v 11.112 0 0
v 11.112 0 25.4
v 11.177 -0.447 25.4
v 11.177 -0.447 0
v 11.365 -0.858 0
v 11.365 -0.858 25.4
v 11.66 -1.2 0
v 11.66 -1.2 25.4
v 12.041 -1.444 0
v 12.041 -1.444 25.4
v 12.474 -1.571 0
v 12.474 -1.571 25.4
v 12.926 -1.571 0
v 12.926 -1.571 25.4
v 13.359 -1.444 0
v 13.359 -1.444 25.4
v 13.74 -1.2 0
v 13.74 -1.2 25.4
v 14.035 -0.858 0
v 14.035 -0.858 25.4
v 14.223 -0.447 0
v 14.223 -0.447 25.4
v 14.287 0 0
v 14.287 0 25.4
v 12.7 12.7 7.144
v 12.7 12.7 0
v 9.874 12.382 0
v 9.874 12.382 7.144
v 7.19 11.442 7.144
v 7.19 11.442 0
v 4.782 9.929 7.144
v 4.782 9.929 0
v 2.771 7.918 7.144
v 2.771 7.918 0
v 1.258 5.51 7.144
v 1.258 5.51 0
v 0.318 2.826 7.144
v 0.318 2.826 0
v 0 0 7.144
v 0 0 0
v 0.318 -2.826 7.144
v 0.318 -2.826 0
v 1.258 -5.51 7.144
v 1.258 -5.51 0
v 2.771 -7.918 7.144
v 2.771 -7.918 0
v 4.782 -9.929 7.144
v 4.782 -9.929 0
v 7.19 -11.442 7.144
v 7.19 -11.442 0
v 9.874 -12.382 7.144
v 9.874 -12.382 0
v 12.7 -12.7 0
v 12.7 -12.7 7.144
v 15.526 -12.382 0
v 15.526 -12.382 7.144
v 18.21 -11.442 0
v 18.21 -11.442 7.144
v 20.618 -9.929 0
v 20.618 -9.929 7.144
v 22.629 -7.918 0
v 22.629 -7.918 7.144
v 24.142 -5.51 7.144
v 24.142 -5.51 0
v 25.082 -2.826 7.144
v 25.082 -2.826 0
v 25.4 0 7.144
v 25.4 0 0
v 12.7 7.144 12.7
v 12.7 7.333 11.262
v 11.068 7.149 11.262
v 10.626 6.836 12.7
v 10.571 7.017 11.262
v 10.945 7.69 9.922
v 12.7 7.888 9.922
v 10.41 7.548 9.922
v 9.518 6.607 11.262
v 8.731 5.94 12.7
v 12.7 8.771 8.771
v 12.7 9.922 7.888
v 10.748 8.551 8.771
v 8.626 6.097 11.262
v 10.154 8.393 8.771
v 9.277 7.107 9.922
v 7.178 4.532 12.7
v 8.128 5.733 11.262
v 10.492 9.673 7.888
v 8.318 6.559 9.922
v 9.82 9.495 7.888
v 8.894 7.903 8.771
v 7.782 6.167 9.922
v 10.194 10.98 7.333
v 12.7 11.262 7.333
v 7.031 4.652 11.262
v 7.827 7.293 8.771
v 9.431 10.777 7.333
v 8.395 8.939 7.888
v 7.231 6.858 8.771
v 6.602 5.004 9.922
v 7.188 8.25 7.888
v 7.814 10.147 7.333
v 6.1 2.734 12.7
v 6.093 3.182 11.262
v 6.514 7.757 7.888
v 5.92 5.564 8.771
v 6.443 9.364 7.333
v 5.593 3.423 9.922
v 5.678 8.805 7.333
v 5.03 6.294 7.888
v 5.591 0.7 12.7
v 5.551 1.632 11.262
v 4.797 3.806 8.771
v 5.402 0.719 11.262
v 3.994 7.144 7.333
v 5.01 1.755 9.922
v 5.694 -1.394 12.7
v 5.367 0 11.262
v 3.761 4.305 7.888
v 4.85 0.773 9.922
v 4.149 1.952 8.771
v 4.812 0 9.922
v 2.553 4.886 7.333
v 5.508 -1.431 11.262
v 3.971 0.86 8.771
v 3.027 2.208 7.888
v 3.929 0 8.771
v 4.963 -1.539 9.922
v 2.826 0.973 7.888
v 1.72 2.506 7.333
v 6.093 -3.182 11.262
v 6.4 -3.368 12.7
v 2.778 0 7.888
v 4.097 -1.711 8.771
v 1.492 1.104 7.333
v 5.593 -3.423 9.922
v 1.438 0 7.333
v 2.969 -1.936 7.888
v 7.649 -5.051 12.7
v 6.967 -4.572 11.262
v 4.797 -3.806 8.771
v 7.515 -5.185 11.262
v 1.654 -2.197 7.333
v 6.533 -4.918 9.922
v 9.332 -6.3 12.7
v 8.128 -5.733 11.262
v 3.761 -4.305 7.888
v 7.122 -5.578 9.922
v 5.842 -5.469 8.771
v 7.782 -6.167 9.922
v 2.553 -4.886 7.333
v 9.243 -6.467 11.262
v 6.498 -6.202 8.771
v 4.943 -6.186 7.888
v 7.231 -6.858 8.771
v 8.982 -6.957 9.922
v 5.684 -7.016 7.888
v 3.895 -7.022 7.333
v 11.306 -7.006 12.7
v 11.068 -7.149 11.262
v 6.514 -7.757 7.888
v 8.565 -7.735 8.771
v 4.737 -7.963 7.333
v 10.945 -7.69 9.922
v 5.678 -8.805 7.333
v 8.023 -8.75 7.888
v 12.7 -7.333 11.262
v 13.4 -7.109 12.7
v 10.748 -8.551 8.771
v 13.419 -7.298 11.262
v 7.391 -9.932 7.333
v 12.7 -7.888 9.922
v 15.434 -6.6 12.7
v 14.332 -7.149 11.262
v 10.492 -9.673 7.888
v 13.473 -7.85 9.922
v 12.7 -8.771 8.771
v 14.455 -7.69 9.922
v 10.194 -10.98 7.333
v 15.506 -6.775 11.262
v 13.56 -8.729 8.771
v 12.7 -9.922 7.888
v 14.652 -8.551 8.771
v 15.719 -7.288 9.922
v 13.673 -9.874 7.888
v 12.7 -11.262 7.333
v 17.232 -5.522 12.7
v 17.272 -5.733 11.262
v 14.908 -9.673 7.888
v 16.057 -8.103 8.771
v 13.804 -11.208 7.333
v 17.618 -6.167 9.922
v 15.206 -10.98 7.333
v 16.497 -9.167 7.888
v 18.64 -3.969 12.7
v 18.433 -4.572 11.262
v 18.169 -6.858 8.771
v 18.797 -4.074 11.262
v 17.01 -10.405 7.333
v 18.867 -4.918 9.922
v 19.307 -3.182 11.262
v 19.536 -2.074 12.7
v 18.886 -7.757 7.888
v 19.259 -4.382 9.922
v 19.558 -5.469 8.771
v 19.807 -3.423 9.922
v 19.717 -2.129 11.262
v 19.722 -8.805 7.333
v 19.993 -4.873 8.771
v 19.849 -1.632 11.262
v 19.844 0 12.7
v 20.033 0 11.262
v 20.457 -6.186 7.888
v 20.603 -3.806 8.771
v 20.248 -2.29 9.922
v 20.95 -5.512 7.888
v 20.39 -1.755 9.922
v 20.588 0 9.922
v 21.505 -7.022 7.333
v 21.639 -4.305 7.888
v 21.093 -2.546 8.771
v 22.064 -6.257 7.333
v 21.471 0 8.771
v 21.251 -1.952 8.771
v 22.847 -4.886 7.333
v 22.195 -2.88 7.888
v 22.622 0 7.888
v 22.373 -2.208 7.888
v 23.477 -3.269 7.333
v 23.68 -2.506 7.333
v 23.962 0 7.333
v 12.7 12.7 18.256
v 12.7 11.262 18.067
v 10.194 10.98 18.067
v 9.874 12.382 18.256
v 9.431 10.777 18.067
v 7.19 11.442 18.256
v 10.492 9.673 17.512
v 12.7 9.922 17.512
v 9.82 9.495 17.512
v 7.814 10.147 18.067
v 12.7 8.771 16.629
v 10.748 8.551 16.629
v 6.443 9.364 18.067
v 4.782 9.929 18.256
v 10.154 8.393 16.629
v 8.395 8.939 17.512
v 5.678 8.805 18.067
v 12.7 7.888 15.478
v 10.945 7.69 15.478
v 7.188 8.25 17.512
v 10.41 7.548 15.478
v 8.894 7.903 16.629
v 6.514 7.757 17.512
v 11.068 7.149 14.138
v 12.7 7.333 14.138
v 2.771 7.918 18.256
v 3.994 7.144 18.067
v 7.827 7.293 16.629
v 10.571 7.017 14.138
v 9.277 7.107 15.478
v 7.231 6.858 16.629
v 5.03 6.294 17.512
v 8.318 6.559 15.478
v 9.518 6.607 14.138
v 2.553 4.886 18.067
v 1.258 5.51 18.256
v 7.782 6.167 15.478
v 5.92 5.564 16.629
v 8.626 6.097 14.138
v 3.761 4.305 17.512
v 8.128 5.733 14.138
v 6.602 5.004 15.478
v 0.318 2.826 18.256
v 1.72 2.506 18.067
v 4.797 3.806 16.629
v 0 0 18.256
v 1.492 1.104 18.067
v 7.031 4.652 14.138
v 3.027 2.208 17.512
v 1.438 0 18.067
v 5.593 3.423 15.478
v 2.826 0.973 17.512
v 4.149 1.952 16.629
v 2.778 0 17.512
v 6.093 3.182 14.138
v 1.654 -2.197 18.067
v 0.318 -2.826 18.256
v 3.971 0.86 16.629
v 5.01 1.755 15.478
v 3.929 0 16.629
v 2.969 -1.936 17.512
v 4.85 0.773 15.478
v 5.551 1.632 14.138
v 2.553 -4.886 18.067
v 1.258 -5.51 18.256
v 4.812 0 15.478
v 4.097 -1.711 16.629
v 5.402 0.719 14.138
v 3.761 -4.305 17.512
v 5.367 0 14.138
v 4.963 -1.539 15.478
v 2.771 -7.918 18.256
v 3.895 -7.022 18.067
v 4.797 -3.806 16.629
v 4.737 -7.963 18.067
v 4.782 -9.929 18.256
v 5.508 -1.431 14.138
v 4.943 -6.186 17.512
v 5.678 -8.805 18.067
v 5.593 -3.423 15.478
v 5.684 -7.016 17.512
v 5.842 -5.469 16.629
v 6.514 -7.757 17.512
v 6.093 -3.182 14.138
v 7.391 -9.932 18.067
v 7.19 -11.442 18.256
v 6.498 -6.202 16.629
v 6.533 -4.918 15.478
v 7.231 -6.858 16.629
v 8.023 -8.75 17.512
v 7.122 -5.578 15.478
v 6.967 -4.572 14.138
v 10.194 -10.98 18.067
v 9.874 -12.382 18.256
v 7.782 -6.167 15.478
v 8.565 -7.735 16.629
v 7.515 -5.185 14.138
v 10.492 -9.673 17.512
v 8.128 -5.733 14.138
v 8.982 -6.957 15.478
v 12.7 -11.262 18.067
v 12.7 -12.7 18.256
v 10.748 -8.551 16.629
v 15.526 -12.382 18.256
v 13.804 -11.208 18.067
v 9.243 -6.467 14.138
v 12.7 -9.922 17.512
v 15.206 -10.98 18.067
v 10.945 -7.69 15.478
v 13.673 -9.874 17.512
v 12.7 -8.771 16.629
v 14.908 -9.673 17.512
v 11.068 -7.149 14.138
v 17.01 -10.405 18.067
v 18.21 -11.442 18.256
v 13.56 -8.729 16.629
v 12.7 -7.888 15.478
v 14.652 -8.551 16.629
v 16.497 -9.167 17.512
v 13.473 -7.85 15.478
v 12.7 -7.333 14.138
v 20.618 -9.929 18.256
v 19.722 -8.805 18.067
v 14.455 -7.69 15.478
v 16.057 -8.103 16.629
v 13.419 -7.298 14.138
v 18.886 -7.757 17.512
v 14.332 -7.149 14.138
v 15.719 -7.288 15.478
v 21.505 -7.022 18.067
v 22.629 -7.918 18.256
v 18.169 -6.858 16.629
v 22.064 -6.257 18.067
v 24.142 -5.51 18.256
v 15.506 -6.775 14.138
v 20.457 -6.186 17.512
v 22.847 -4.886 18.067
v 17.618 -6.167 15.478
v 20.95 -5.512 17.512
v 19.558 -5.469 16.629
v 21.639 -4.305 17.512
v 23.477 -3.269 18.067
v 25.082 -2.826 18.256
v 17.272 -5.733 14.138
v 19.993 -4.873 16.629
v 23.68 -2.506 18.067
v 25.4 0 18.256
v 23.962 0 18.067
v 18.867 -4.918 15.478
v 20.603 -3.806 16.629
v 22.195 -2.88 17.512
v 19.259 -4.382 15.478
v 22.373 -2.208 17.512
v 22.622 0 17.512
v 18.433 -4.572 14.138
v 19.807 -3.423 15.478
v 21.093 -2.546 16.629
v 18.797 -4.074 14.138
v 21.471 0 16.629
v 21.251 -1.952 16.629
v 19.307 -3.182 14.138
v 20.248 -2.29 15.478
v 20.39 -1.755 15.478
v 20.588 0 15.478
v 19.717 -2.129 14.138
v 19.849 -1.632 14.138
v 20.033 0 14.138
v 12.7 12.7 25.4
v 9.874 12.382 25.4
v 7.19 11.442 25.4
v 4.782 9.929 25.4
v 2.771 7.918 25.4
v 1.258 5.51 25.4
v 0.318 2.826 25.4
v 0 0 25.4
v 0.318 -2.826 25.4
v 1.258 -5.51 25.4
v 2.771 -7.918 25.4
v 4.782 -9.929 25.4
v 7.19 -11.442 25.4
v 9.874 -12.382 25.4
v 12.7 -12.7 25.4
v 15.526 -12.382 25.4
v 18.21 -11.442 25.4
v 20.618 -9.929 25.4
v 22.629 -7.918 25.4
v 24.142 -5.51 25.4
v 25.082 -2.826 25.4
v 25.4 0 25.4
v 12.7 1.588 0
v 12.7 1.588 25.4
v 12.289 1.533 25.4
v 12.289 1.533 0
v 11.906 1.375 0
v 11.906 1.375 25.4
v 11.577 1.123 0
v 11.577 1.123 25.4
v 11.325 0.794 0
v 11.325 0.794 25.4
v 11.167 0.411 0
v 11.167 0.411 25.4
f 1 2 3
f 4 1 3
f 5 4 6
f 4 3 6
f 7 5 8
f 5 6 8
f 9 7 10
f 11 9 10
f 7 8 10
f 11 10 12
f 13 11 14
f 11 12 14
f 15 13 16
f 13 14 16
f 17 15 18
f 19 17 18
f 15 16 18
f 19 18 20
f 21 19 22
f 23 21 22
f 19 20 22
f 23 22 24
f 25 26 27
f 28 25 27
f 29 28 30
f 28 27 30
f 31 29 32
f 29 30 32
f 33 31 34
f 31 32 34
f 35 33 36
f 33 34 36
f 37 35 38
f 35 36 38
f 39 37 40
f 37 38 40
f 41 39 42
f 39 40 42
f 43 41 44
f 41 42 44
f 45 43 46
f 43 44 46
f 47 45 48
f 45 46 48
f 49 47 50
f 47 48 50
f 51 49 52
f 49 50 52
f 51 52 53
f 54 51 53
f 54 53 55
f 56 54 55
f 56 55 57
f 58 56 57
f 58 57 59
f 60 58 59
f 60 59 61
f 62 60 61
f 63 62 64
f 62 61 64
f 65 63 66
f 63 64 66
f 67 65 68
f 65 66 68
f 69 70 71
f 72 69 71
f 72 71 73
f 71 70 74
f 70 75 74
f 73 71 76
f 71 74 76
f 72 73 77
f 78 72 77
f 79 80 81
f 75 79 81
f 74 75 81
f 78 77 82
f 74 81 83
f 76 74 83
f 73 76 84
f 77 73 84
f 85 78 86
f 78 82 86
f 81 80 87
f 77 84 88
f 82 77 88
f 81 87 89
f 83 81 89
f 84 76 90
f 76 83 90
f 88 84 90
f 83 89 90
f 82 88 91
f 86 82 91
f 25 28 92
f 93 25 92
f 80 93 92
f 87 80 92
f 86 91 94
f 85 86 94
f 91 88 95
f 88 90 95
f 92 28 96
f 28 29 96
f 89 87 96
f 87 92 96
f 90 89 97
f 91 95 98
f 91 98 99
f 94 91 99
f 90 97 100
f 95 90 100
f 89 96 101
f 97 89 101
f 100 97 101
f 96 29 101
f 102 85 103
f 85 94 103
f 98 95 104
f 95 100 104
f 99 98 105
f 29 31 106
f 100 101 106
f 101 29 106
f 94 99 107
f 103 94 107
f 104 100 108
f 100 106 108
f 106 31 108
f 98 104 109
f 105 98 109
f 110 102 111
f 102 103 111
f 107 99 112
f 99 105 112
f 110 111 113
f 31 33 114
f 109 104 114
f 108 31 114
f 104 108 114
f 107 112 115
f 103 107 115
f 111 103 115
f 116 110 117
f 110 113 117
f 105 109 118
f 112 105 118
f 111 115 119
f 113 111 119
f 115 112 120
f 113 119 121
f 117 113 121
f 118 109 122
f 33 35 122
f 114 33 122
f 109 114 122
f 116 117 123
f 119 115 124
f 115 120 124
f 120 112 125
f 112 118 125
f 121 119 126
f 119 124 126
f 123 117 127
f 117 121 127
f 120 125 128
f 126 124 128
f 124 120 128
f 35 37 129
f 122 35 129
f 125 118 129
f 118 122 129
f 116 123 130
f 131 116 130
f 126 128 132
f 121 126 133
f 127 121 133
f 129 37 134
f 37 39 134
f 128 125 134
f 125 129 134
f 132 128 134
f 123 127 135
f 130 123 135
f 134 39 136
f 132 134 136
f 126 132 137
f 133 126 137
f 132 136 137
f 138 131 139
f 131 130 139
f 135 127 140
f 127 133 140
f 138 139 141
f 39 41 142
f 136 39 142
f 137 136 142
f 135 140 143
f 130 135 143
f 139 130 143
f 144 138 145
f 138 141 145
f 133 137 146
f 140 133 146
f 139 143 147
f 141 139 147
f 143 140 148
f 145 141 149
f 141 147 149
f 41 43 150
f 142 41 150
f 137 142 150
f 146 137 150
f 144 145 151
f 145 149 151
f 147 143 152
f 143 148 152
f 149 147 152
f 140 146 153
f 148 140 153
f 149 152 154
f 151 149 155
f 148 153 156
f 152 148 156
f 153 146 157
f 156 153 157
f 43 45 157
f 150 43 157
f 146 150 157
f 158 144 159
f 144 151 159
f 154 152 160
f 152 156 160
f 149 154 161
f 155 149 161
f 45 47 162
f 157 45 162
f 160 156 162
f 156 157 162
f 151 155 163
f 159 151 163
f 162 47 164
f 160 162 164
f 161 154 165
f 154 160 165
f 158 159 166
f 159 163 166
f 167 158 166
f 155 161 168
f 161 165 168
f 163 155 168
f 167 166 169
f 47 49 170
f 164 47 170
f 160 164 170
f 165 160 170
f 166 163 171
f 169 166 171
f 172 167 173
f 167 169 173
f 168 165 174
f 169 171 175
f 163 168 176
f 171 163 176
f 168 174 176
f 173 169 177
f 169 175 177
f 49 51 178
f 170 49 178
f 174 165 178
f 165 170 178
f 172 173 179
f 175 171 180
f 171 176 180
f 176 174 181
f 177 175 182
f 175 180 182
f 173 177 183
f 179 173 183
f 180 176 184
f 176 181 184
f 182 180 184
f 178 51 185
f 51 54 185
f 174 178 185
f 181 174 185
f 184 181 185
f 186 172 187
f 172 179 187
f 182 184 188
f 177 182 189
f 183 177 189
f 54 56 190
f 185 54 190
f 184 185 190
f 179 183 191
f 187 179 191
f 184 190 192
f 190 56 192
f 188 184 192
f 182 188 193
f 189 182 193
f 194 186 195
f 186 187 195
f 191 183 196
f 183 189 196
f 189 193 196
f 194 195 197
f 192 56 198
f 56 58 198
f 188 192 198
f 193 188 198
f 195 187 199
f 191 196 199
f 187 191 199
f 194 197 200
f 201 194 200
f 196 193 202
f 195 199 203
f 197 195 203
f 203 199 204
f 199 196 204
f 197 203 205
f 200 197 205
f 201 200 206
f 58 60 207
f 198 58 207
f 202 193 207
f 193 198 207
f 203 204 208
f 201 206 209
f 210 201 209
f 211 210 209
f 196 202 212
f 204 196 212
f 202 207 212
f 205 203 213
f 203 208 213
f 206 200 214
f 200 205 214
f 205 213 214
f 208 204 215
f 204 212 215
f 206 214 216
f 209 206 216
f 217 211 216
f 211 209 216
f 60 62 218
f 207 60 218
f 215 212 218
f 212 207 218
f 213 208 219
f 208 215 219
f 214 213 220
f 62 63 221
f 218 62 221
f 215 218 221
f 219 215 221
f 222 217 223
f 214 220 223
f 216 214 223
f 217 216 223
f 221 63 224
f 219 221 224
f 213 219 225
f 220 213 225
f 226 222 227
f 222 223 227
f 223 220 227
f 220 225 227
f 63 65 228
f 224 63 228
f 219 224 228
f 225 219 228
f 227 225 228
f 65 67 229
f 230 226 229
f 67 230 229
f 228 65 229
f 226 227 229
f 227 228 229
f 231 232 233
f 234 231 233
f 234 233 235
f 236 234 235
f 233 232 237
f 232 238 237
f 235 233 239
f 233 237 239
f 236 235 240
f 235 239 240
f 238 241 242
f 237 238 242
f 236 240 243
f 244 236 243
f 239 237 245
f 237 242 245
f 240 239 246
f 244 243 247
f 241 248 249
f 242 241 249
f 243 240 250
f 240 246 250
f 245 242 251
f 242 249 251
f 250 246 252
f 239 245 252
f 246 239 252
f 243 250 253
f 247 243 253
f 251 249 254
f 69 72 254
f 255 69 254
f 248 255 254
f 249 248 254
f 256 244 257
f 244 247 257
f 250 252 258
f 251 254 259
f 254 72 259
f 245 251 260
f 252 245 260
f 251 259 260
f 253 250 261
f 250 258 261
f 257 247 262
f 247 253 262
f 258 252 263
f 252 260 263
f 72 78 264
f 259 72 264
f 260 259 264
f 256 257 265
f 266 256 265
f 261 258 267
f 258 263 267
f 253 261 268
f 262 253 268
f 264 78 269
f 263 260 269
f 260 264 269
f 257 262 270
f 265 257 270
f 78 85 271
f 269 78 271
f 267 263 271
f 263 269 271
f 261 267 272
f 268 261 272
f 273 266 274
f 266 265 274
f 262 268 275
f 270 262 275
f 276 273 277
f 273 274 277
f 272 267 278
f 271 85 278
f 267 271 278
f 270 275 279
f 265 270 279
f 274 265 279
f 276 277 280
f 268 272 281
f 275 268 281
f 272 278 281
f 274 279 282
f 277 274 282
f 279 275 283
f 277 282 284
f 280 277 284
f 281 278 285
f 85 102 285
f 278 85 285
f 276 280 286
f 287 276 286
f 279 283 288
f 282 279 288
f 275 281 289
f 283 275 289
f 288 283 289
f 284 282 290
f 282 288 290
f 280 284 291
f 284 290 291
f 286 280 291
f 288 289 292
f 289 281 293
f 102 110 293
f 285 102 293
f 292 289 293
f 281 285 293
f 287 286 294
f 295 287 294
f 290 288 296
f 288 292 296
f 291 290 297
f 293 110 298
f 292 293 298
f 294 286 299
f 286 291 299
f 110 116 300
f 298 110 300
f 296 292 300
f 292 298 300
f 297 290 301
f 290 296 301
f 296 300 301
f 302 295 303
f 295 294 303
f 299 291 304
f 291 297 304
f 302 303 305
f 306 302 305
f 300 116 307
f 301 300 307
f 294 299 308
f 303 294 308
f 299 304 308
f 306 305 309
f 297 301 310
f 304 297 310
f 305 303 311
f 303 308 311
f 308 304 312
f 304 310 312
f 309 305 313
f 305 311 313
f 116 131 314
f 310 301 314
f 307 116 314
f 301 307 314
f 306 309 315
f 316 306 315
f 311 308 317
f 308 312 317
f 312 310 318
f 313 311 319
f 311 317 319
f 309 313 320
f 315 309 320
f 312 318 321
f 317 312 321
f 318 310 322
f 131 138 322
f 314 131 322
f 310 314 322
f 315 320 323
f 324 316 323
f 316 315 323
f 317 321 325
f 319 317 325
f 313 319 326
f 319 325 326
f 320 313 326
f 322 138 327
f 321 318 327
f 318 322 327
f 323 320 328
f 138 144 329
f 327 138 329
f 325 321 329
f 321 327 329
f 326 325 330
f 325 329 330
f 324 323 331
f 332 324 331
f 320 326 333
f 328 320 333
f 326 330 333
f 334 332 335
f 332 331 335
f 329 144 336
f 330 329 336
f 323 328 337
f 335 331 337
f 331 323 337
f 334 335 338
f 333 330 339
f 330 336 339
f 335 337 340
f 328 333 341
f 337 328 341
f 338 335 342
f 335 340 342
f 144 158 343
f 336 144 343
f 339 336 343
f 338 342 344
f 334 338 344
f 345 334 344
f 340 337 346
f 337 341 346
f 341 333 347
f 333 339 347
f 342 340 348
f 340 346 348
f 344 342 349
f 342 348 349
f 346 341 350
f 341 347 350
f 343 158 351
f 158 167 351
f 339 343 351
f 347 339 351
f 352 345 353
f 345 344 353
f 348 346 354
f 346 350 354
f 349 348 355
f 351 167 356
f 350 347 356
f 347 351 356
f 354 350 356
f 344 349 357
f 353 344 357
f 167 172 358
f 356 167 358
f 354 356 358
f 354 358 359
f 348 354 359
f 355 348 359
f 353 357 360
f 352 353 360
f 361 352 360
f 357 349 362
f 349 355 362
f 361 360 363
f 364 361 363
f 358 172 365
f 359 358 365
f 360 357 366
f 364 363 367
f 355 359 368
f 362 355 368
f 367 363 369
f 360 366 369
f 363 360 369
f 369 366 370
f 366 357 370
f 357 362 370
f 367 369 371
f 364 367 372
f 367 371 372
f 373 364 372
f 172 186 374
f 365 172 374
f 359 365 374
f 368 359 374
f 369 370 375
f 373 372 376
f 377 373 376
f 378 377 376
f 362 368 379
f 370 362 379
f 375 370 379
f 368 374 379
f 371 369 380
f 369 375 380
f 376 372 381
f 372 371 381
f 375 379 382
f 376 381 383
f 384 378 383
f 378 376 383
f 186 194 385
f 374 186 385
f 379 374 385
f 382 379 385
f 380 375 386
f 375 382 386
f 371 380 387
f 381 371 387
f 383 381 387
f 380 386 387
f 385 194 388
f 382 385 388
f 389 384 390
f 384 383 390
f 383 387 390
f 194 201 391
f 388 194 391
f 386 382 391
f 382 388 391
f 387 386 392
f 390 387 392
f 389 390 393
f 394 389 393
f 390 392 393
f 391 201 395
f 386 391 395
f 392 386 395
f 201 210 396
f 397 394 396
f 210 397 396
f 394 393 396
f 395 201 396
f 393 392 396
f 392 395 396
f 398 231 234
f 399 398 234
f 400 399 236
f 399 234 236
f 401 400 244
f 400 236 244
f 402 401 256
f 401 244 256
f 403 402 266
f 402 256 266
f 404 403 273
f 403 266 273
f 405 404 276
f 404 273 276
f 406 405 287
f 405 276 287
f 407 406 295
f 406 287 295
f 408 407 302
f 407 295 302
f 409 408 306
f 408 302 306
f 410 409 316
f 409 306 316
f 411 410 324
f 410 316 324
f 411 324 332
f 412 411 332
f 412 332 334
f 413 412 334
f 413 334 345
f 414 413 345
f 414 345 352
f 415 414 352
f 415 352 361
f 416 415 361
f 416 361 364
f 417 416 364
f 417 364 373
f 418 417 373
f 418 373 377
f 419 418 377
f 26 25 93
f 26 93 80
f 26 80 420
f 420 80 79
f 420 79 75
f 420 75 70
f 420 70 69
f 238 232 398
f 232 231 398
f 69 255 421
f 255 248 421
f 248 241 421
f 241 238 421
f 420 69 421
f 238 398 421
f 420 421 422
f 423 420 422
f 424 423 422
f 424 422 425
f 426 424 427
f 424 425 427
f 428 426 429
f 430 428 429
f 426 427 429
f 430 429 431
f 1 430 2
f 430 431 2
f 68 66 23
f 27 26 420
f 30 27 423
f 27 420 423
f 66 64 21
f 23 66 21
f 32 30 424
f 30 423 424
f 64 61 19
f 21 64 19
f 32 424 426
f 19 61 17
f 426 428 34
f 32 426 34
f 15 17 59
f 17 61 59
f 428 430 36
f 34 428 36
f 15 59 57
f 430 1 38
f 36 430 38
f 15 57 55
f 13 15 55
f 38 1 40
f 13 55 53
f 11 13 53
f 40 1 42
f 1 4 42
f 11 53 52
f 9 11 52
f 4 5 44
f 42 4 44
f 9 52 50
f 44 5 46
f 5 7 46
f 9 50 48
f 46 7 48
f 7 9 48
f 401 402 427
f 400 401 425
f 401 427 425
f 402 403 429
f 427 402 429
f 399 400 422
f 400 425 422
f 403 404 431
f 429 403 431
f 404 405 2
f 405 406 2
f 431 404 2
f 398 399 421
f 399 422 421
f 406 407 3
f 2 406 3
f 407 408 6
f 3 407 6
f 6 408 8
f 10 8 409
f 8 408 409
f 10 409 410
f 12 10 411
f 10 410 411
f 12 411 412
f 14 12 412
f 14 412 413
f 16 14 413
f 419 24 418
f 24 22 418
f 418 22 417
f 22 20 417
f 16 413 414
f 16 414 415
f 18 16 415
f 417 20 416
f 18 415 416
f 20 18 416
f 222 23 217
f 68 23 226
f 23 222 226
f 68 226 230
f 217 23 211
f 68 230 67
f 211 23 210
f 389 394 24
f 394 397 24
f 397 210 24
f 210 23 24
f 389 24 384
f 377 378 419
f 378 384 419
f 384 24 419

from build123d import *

# Parameters (mm, degrees)
F3_DEPTH = 25.401


with BuildPart() as f1:
    # F0 (on Front) → F1 (revolve)
    with BuildSketch(Plane.XZ):
        with BuildLine():
            Line((0, 7.14375), (0, 0))
            Line((0, 0), (12.7, 0))
            Line((12.7, 0), (12.7, 25.4))
            Line((12.7, 25.4), (0, 25.4))
            Line((0, 25.4), (0, 18.25625))
            ThreePointArc((0, 18.25625), (3.928862053, 16.628862053), (5.55625, 12.7))
            ThreePointArc((5.55625, 12.7), (3.928862053, 8.771137947), (0, 7.14375))
        make_face()
    revolve(axis=Axis((12.7, 0, 12.7), (0, 0, 1)))

    # F2 (on face) → F3 (cut, through all)
    with BuildSketch(Plane.XY.offset(25.4)):
        with BuildLine():
            Line((12.7, 1.5875), (12.7, 0))
            Line((12.7, 0), (14.2875, 0))
            ThreePointArc((14.2875, 0), (13.8225320151, 1.1225320151), (12.7, 1.5875))
        make_face()
        with BuildLine():
            Line((14.2875, 0), (12.7, 0))
            Line((12.7, 0), (11.1125, 0))
            ThreePointArc((11.1125, 0), (12.7, -1.5875), (14.2875, 0))
        make_face()
        with BuildLine():
            Line((11.1125, 0), (12.7, 0))
            Line((12.7, 0), (12.7, 1.5875))
            ThreePointArc((12.7, 1.5875), (11.5774679849, 1.1225320151), (11.1125, 0))
        make_face()
        with BuildLine():
            ThreePointArc((12.7, 1.5875), (13.8225320151, 1.1225320151), (14.2875, 0))
            Line((14.2875, 0), (25.4, 0))
            ThreePointArc((25.4, 0), (21.6802561211, 8.9802561211), (12.7, 12.7))
            Line((12.7, 12.7), (12.7, 1.5875))
        make_face()
    extrude(amount=-F3_DEPTH, mode=Mode.SUBTRACT)


solid = f1.part
